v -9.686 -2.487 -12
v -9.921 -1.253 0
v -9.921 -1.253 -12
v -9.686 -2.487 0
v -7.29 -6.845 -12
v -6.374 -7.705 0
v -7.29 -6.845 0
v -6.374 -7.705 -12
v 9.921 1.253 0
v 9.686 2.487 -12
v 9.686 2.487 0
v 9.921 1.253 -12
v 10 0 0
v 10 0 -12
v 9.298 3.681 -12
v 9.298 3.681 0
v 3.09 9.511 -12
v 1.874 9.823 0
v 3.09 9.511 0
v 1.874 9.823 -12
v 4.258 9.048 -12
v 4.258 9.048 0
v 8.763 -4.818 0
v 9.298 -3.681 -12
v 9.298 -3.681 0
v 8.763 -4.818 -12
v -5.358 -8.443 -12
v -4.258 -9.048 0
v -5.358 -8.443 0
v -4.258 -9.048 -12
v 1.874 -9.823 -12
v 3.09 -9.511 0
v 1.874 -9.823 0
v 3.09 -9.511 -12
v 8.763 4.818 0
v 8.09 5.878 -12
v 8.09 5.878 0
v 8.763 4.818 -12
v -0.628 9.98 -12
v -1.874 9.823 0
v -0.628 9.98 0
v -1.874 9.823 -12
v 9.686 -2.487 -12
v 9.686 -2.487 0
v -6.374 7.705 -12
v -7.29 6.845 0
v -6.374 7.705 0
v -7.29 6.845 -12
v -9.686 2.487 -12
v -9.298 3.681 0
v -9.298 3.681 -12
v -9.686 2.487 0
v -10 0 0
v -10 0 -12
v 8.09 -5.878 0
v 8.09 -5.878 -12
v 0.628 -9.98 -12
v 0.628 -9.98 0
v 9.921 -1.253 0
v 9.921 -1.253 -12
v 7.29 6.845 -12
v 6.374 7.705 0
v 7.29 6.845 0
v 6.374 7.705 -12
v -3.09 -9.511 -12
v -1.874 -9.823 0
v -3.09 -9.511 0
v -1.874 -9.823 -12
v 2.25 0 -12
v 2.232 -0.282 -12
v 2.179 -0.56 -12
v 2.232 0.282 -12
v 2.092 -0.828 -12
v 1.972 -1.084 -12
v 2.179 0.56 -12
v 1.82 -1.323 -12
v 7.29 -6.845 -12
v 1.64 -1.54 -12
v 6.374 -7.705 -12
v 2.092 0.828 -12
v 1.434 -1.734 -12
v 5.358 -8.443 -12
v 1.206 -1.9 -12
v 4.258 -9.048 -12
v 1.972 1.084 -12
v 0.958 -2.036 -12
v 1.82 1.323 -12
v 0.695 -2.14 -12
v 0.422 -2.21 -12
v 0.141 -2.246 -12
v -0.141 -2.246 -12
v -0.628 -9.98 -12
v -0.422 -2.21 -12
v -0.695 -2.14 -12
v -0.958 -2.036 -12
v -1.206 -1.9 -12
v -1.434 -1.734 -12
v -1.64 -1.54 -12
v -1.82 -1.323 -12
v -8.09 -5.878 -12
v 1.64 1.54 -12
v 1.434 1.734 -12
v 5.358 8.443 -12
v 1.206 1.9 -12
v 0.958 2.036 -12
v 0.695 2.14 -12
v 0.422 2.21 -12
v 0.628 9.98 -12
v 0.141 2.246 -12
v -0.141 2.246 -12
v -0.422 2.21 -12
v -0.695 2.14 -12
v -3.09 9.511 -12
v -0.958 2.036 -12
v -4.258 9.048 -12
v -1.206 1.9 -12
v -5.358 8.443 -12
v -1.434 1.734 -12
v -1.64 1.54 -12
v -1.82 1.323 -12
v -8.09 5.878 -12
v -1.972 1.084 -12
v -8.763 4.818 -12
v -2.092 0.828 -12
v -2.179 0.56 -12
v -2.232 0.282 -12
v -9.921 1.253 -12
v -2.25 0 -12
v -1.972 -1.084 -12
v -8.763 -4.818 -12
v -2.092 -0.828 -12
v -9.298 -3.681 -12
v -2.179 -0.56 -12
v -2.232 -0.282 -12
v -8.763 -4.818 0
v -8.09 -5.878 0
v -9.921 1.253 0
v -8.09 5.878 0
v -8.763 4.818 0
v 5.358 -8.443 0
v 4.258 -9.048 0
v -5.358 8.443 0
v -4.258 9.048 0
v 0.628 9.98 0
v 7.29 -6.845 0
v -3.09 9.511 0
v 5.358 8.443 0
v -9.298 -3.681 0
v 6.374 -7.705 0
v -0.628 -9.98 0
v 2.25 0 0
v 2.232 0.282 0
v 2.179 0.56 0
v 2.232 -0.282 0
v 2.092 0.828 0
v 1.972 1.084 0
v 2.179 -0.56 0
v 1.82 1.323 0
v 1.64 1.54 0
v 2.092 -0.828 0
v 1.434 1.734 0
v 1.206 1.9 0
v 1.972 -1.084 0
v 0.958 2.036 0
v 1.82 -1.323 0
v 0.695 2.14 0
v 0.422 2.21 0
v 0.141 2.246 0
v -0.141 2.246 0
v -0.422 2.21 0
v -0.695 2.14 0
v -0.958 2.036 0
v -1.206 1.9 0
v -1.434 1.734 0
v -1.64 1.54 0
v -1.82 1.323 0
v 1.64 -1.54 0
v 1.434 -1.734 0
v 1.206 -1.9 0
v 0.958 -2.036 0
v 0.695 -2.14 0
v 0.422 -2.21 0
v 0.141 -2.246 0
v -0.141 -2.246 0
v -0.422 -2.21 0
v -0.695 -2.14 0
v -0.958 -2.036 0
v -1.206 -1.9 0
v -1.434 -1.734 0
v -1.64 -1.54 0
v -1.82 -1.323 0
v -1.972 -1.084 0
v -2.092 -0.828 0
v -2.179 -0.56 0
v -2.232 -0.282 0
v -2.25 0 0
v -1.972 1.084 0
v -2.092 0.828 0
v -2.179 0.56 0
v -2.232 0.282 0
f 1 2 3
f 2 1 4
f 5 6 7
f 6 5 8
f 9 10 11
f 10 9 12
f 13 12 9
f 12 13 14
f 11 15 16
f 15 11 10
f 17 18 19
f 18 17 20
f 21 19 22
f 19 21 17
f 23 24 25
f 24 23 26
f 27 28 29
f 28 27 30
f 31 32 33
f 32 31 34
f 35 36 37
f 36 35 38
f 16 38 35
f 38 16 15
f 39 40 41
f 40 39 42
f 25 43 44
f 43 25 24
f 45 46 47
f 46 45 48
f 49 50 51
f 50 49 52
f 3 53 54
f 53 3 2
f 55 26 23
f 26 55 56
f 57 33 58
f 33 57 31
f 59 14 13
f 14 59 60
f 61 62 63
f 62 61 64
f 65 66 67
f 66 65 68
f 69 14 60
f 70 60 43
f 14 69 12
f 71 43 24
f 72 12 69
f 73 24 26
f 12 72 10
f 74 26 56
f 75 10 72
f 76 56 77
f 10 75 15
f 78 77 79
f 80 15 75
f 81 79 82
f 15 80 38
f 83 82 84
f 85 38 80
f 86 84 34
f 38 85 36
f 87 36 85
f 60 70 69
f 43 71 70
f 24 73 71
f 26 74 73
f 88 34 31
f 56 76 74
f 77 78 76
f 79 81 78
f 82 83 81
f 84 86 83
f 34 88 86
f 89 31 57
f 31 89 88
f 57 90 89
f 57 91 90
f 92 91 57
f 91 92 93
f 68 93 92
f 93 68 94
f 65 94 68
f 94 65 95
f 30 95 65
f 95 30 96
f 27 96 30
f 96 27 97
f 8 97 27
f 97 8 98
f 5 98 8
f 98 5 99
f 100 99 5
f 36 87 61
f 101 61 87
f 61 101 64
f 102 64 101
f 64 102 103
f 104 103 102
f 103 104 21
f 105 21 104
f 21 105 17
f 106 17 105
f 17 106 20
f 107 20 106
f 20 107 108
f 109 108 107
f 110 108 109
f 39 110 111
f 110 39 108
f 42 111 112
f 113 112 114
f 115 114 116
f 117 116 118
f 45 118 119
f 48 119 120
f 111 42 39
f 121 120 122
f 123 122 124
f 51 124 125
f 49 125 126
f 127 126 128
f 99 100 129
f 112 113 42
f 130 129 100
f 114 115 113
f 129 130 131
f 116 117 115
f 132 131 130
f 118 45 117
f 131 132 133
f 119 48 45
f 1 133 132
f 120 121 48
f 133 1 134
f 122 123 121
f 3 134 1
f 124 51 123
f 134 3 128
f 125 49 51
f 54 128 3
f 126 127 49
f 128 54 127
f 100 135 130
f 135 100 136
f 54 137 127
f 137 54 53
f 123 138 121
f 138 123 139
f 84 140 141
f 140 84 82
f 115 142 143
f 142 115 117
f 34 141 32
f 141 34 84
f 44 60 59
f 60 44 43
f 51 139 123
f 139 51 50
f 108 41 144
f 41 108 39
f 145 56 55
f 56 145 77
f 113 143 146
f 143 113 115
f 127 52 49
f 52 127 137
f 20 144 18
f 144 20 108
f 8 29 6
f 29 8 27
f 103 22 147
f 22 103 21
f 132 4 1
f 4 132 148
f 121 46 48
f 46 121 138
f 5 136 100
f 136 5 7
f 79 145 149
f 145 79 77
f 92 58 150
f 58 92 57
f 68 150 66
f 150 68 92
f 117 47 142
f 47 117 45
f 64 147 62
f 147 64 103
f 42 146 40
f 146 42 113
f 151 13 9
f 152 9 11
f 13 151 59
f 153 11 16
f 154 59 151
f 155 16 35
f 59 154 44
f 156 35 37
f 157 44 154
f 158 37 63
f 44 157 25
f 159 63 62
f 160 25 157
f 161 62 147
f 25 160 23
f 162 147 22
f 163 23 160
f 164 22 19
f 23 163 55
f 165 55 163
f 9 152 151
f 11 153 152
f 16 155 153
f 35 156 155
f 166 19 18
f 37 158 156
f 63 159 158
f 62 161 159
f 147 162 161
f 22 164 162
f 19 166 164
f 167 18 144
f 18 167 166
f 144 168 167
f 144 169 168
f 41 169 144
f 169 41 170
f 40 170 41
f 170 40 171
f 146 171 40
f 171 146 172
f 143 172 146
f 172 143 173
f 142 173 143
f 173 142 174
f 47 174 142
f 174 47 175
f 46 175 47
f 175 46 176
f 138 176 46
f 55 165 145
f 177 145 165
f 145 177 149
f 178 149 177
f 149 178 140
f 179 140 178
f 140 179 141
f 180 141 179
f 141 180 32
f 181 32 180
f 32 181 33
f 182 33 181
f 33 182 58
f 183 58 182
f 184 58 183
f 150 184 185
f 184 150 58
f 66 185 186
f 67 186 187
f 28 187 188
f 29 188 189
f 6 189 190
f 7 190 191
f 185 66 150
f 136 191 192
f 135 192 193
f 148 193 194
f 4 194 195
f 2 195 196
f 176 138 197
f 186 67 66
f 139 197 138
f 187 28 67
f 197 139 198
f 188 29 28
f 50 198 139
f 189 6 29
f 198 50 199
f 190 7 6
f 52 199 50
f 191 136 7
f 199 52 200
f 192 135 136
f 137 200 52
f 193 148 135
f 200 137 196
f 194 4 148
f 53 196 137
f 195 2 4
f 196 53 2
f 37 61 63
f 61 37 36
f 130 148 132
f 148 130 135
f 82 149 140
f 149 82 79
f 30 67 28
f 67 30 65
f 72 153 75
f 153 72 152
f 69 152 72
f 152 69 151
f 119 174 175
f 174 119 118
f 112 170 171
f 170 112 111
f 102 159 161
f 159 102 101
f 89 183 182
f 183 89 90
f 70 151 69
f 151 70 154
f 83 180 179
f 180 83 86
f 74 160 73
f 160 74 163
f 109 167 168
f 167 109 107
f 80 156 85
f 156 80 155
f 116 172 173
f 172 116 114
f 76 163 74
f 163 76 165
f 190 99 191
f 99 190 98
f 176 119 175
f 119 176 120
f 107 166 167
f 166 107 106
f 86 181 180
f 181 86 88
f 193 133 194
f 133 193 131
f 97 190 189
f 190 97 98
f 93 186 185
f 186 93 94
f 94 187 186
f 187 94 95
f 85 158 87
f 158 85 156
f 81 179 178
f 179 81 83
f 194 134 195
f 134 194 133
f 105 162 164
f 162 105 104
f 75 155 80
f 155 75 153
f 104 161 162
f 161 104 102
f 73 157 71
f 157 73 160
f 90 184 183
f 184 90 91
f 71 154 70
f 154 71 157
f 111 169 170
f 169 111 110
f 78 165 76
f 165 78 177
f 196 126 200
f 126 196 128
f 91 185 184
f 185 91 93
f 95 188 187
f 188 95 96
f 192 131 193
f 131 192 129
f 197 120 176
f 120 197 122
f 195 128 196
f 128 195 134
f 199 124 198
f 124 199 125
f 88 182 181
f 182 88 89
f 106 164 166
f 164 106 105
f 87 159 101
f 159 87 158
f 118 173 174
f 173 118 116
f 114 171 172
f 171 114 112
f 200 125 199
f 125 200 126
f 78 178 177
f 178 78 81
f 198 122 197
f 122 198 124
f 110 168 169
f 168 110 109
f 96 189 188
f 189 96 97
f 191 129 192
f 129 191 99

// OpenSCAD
$fn = 50;


difference() {
	union() {
		translate(v = [0, 0, -12.0000000000]) {
			cylinder(h = 12, r = 10.0000000000);
		}
		cylinder(h = 0, r = 16.0000000000);
	}
	union() {
		#translate(v = [0, 0, -12]) {
			cylinder(h = 12, r = 2.2500000000);
		}
	}
}
